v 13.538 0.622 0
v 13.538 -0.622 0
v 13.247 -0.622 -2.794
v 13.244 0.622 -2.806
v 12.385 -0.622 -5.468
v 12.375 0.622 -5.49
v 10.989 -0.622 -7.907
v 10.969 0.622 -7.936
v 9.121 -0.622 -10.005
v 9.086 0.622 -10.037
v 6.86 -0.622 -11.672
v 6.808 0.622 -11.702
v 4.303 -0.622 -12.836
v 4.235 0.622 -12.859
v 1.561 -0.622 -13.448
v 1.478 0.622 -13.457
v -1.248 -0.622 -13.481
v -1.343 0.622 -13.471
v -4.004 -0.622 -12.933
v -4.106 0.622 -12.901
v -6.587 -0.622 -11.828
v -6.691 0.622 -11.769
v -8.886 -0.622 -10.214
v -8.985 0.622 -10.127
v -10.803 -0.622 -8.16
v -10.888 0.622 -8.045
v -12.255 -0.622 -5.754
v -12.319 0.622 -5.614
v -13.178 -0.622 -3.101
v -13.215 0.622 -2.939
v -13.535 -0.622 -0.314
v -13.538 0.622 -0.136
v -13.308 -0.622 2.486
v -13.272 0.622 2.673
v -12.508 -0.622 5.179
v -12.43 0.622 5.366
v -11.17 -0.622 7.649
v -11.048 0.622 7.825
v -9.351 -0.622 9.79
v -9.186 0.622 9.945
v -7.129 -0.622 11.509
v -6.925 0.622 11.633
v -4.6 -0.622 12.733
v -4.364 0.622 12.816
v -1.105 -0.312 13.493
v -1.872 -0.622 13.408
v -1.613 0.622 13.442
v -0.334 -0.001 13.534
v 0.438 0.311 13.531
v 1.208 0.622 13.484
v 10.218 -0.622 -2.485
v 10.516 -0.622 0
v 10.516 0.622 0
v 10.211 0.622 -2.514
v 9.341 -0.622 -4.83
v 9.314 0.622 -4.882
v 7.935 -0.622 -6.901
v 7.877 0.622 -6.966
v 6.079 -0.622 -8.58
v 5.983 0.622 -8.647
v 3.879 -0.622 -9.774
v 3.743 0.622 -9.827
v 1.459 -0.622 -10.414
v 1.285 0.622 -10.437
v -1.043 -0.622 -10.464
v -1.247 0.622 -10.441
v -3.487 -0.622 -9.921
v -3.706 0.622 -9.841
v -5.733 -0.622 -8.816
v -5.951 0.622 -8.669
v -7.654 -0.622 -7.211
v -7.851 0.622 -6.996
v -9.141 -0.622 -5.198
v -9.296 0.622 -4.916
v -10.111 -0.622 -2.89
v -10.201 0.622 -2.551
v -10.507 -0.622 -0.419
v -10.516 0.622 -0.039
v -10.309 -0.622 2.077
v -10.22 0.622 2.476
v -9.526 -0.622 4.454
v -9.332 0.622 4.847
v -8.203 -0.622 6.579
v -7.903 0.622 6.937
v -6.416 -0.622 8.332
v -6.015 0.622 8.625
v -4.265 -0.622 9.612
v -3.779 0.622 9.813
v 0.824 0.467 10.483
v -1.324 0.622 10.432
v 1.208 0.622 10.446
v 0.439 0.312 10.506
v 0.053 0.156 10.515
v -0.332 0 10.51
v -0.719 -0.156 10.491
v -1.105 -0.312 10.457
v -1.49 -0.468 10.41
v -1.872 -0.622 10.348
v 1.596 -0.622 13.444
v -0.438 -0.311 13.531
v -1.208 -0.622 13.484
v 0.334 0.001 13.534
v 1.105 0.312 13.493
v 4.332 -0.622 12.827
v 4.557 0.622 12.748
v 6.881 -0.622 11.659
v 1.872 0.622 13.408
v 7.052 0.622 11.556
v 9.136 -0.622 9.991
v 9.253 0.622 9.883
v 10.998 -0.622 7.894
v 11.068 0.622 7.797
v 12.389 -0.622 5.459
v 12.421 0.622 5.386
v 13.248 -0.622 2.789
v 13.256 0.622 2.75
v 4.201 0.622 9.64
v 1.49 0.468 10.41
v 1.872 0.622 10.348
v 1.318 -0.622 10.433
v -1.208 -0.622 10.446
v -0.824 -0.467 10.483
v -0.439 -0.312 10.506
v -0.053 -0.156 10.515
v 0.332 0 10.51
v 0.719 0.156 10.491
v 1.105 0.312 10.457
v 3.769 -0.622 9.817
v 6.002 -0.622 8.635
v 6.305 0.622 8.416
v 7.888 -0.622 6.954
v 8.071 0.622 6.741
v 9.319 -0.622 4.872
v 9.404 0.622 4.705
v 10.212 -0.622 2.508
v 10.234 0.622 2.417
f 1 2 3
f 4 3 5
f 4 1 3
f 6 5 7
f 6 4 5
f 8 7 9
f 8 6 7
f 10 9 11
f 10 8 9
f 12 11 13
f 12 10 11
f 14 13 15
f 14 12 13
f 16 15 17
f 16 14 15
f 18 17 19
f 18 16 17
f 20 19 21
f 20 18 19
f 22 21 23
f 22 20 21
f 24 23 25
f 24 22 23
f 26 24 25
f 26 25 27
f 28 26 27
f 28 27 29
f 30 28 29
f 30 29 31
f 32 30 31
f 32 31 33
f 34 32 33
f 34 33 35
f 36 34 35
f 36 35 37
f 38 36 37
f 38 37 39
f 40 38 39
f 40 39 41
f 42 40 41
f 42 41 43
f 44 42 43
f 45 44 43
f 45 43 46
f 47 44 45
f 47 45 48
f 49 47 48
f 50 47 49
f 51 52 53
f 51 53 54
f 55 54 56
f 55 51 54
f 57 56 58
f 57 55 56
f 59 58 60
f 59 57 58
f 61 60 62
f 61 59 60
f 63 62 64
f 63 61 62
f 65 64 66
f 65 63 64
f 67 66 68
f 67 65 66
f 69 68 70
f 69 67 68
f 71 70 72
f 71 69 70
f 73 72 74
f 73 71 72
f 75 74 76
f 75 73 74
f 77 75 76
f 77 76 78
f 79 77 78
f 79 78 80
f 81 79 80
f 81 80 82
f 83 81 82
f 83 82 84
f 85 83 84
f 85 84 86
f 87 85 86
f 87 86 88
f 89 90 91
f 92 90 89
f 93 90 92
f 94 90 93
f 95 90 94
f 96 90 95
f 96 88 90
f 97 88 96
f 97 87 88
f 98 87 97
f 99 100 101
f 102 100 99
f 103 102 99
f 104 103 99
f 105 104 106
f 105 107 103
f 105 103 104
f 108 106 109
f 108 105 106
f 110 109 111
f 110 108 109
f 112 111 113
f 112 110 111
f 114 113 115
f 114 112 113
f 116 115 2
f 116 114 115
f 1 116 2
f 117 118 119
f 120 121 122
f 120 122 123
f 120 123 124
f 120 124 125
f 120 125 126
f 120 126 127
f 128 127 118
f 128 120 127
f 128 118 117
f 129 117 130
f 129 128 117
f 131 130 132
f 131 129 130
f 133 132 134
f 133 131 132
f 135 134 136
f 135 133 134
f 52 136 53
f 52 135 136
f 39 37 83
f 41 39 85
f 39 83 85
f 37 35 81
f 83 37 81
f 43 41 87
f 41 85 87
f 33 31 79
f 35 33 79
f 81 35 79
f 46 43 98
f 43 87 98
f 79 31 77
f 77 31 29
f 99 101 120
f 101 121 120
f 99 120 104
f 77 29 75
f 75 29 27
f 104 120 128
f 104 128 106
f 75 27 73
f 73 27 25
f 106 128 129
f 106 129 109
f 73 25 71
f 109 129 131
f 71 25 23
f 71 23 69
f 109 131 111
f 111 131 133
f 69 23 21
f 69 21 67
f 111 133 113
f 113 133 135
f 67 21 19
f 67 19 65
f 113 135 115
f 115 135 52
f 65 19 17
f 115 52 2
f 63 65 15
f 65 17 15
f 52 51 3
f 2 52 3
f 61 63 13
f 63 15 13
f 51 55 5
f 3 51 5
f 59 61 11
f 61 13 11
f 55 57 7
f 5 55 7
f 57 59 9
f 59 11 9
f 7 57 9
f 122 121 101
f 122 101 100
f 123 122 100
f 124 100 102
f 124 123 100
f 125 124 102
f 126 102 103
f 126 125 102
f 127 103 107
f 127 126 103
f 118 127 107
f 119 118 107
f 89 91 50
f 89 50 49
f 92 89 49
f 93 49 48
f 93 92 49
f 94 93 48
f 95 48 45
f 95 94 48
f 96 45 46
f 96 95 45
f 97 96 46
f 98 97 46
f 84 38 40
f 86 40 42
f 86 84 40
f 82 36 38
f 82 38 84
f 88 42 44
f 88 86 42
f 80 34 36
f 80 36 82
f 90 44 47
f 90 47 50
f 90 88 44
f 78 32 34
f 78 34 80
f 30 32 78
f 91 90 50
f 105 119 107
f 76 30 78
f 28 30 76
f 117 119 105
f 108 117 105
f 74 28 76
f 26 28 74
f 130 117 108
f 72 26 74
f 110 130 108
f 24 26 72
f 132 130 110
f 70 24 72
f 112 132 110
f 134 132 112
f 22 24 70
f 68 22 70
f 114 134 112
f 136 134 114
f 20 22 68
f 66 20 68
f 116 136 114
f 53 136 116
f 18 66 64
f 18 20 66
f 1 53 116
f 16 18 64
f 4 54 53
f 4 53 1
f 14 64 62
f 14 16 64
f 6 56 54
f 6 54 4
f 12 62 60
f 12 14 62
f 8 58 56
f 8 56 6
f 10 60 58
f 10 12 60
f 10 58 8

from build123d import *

# Parameters (mm, degrees)
SKETCH3_R                = 13.5382
SKETCH3_R_2              = 10.5156
BOSS_EXTRUDE1_DEPTH      = 0.6223
BOSS_EXTRUDE1_DEPTH_BACK = 0.6223
CUT_EXTRUDE1_DEPTH       = 14.5382


with BuildPart() as part:
    # Sketch3 → Boss-Extrude1 (new body, two sides)
    with BuildSketch(Plane(origin=(0, 0, 0), x_dir=(1, 0, 0), z_dir=(0, 1, 0))) as boss_extrude1_sk:
        Circle(SKETCH3_R)
        Circle(SKETCH3_R_2, mode=Mode.SUBTRACT)
    extrude(amount=BOSS_EXTRUDE1_DEPTH)
    extrude(boss_extrude1_sk.sketch, amount=-BOSS_EXTRUDE1_DEPTH_BACK)

    # Sketch4 → Cut-Extrude1 (cut, through all)
    with BuildSketch(Plane.XY):
        Polygon((2.838309027, 1.280985718), (-2.9315561, -1.050191113), (-2.838309027, -1.280985718), (2.9315561, 1.050191113), align=None)
    extrude(amount=CUT_EXTRUDE1_DEPTH, mode=Mode.SUBTRACT)


solid = part.part
